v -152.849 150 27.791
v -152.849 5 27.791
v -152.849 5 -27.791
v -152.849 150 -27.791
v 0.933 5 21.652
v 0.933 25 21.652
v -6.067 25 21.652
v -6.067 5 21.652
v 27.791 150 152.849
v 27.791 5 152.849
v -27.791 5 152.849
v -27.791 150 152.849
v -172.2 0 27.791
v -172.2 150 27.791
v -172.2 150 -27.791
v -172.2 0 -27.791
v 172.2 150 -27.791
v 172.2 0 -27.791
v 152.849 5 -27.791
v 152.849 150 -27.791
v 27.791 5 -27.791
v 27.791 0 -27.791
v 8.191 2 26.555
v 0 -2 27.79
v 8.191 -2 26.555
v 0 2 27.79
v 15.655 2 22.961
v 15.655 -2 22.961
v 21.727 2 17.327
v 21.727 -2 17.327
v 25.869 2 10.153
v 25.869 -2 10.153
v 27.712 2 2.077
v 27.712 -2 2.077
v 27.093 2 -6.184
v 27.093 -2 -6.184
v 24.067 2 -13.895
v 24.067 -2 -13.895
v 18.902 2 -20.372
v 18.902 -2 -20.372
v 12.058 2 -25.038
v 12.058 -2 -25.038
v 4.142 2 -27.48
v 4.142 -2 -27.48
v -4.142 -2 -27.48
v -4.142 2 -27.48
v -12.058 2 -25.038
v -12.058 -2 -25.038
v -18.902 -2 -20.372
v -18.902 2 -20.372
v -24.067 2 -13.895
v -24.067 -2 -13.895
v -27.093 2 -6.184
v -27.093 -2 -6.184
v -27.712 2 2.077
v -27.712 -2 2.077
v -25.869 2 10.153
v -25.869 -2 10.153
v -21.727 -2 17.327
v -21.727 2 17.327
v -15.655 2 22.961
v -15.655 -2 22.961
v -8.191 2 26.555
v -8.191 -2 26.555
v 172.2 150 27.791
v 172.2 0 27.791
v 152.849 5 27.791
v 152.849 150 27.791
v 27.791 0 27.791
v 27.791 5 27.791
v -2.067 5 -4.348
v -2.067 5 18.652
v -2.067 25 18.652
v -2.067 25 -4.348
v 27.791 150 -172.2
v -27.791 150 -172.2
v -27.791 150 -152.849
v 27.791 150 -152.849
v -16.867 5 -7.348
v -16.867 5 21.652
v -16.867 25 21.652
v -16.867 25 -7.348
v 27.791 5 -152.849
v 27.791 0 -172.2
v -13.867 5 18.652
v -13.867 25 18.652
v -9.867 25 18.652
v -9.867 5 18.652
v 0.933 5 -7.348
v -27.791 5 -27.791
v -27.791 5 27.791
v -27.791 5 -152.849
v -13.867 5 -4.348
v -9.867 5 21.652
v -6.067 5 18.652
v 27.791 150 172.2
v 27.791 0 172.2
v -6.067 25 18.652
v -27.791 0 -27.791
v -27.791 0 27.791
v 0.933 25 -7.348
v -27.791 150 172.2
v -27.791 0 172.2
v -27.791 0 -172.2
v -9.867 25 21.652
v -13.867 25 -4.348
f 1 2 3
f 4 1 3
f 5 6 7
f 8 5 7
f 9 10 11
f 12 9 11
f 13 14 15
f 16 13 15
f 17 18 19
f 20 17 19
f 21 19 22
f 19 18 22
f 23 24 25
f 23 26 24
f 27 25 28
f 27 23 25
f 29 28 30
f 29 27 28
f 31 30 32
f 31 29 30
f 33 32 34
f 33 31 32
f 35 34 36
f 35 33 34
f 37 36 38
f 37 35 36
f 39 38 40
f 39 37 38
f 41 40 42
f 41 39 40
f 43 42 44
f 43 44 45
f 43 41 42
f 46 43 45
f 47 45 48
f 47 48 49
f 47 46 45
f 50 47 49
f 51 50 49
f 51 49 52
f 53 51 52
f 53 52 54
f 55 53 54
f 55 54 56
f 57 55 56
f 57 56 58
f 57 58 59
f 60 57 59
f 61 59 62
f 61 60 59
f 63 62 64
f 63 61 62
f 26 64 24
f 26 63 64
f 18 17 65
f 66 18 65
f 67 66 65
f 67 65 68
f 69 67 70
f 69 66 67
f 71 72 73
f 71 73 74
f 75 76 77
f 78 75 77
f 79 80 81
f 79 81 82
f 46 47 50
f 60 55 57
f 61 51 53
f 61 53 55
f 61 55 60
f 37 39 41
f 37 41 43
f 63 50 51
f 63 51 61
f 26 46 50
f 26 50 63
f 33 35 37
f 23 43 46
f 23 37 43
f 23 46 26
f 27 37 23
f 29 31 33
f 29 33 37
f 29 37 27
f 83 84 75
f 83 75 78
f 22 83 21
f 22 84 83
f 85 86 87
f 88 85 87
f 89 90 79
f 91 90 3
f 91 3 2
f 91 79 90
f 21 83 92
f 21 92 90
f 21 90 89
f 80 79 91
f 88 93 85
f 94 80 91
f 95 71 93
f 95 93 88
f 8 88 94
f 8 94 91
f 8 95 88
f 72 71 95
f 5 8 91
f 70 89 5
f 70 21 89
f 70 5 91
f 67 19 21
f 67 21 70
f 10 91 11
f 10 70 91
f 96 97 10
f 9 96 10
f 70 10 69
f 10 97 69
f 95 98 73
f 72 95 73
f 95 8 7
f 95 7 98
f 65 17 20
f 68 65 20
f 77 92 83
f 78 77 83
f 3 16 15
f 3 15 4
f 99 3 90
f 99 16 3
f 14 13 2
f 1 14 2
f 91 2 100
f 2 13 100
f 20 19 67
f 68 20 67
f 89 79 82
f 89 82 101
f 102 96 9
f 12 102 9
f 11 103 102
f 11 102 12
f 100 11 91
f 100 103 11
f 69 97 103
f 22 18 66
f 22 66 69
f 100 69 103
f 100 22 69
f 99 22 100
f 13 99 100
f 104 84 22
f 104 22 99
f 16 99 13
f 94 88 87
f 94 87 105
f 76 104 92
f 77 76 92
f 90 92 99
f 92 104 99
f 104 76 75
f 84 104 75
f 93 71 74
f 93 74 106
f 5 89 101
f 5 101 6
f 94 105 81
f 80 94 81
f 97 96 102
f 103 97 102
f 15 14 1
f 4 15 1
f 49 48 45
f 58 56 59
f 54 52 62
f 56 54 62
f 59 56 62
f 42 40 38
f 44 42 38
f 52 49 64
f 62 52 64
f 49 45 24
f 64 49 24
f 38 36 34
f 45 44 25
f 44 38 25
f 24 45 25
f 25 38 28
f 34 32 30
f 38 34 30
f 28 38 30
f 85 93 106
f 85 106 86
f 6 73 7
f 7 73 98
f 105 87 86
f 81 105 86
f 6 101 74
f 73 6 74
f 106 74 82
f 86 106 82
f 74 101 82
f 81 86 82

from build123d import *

# Parameters (mm, degrees)
SKETCH6_R            = 27.79
BOSS_EXTRUDE3_DEPTH  = 2
SKETCH5_W            = 125.058776632
SKETCH5_H            = 55.581678504
BOSS_EXTRUDE9_DEPTH  = 5
CIRPATTERN7_COUNT    = 4
SKETCH14_W           = 19.351012163
SKETCH14_H           = 55.581678504
BOSS_EXTRUDE10_DEPTH = 150
CIRPATTERN9_COUNT    = 4
SKETCH15_W           = 55.58
SKETCH15_H           = 55.58
BOSS_EXTRUDE11_DEPTH = 5
BOSS_EXTRUDE12_DEPTH = 25


with BuildPart() as part:
    # Sketch6 → Boss-Extrude3 (new, symmetric)
    with BuildSketch(Plane(origin=(0, 0, 0), x_dir=(1, 0, 0), z_dir=(0, 1, 0))):
        with Locations(Location((0, 0, 0), (0, 0, 270))):
            Circle(SKETCH6_R)
    extrude(amount=BOSS_EXTRUDE3_DEPTH, both=True)


with BuildPart() as body_2:
    # Sketch5 → Boss-Extrude9 (new body)
    with BuildSketch(Plane(origin=(0, 0, 0), x_dir=(1, 0, 0), z_dir=(0, 1, 0))):
        with Locations((-90.319388316, 0)):
            Rectangle(SKETCH5_W, SKETCH5_H)
    boss_extrude9 = extrude(amount=BOSS_EXTRUDE9_DEPTH)

    # CirPattern7: Boss-Extrude9 ×4 about axis
    cirpattern7_axis = Axis((0, 0, 0), (0, 1, 0))
    for i in range(1, CIRPATTERN7_COUNT):
        add(boss_extrude9.rotate(cirpattern7_axis, i * 360 / CIRPATTERN7_COUNT))

    # Sketch14 → Boss-Extrude10 (add)
    with BuildSketch(Plane(origin=(0, 0, 0), x_dir=(1, 0, 0), z_dir=(0, 1, 0))):
        with Locations((-162.524282714, 0)):
            Rectangle(SKETCH14_W, SKETCH14_H)
    boss_extrude10 = extrude(amount=BOSS_EXTRUDE10_DEPTH)

    # CirPattern9: Boss-Extrude10 ×4 about axis
    cirpattern9_axis = Axis((0, 0, 0), (0, 1, 0))
    for i in range(1, CIRPATTERN9_COUNT):
        add(boss_extrude10.rotate(cirpattern9_axis, i * 360 / CIRPATTERN9_COUNT))

    # Sketch15 → Boss-Extrude11 (add)
    with BuildSketch(Plane(origin=(0, 0, 0), x_dir=(1, 0, 0), z_dir=(0, 1, 0))):
        Rectangle(SKETCH15_W, SKETCH15_H)
    extrude(amount=BOSS_EXTRUDE11_DEPTH)

    # Sketch16 → Boss-Extrude12 (add)
    with BuildSketch(Plane(origin=(0, 0, 0), x_dir=(1, 0, 0), z_dir=(0, 1, 0))):
        Polygon((-16.866862525, 7.347575327), (0.933137475, 7.347575327), (0.933137475, -21.652424673), (-6.066862525, -21.652424673), (-6.066862525, -18.652424673), (-2.066862525, -18.652424673), (-2.066862525, 4.347575327), (-13.866862525, 4.347575327), (-13.866862525, -18.652424673), (-9.866862525, -18.652424673), (-9.866862525, -21.652424673), (-16.866862525, -21.652424673), align=None)
    extrude(amount=BOSS_EXTRUDE12_DEPTH)


solid = Compound([part.part, body_2.part])
